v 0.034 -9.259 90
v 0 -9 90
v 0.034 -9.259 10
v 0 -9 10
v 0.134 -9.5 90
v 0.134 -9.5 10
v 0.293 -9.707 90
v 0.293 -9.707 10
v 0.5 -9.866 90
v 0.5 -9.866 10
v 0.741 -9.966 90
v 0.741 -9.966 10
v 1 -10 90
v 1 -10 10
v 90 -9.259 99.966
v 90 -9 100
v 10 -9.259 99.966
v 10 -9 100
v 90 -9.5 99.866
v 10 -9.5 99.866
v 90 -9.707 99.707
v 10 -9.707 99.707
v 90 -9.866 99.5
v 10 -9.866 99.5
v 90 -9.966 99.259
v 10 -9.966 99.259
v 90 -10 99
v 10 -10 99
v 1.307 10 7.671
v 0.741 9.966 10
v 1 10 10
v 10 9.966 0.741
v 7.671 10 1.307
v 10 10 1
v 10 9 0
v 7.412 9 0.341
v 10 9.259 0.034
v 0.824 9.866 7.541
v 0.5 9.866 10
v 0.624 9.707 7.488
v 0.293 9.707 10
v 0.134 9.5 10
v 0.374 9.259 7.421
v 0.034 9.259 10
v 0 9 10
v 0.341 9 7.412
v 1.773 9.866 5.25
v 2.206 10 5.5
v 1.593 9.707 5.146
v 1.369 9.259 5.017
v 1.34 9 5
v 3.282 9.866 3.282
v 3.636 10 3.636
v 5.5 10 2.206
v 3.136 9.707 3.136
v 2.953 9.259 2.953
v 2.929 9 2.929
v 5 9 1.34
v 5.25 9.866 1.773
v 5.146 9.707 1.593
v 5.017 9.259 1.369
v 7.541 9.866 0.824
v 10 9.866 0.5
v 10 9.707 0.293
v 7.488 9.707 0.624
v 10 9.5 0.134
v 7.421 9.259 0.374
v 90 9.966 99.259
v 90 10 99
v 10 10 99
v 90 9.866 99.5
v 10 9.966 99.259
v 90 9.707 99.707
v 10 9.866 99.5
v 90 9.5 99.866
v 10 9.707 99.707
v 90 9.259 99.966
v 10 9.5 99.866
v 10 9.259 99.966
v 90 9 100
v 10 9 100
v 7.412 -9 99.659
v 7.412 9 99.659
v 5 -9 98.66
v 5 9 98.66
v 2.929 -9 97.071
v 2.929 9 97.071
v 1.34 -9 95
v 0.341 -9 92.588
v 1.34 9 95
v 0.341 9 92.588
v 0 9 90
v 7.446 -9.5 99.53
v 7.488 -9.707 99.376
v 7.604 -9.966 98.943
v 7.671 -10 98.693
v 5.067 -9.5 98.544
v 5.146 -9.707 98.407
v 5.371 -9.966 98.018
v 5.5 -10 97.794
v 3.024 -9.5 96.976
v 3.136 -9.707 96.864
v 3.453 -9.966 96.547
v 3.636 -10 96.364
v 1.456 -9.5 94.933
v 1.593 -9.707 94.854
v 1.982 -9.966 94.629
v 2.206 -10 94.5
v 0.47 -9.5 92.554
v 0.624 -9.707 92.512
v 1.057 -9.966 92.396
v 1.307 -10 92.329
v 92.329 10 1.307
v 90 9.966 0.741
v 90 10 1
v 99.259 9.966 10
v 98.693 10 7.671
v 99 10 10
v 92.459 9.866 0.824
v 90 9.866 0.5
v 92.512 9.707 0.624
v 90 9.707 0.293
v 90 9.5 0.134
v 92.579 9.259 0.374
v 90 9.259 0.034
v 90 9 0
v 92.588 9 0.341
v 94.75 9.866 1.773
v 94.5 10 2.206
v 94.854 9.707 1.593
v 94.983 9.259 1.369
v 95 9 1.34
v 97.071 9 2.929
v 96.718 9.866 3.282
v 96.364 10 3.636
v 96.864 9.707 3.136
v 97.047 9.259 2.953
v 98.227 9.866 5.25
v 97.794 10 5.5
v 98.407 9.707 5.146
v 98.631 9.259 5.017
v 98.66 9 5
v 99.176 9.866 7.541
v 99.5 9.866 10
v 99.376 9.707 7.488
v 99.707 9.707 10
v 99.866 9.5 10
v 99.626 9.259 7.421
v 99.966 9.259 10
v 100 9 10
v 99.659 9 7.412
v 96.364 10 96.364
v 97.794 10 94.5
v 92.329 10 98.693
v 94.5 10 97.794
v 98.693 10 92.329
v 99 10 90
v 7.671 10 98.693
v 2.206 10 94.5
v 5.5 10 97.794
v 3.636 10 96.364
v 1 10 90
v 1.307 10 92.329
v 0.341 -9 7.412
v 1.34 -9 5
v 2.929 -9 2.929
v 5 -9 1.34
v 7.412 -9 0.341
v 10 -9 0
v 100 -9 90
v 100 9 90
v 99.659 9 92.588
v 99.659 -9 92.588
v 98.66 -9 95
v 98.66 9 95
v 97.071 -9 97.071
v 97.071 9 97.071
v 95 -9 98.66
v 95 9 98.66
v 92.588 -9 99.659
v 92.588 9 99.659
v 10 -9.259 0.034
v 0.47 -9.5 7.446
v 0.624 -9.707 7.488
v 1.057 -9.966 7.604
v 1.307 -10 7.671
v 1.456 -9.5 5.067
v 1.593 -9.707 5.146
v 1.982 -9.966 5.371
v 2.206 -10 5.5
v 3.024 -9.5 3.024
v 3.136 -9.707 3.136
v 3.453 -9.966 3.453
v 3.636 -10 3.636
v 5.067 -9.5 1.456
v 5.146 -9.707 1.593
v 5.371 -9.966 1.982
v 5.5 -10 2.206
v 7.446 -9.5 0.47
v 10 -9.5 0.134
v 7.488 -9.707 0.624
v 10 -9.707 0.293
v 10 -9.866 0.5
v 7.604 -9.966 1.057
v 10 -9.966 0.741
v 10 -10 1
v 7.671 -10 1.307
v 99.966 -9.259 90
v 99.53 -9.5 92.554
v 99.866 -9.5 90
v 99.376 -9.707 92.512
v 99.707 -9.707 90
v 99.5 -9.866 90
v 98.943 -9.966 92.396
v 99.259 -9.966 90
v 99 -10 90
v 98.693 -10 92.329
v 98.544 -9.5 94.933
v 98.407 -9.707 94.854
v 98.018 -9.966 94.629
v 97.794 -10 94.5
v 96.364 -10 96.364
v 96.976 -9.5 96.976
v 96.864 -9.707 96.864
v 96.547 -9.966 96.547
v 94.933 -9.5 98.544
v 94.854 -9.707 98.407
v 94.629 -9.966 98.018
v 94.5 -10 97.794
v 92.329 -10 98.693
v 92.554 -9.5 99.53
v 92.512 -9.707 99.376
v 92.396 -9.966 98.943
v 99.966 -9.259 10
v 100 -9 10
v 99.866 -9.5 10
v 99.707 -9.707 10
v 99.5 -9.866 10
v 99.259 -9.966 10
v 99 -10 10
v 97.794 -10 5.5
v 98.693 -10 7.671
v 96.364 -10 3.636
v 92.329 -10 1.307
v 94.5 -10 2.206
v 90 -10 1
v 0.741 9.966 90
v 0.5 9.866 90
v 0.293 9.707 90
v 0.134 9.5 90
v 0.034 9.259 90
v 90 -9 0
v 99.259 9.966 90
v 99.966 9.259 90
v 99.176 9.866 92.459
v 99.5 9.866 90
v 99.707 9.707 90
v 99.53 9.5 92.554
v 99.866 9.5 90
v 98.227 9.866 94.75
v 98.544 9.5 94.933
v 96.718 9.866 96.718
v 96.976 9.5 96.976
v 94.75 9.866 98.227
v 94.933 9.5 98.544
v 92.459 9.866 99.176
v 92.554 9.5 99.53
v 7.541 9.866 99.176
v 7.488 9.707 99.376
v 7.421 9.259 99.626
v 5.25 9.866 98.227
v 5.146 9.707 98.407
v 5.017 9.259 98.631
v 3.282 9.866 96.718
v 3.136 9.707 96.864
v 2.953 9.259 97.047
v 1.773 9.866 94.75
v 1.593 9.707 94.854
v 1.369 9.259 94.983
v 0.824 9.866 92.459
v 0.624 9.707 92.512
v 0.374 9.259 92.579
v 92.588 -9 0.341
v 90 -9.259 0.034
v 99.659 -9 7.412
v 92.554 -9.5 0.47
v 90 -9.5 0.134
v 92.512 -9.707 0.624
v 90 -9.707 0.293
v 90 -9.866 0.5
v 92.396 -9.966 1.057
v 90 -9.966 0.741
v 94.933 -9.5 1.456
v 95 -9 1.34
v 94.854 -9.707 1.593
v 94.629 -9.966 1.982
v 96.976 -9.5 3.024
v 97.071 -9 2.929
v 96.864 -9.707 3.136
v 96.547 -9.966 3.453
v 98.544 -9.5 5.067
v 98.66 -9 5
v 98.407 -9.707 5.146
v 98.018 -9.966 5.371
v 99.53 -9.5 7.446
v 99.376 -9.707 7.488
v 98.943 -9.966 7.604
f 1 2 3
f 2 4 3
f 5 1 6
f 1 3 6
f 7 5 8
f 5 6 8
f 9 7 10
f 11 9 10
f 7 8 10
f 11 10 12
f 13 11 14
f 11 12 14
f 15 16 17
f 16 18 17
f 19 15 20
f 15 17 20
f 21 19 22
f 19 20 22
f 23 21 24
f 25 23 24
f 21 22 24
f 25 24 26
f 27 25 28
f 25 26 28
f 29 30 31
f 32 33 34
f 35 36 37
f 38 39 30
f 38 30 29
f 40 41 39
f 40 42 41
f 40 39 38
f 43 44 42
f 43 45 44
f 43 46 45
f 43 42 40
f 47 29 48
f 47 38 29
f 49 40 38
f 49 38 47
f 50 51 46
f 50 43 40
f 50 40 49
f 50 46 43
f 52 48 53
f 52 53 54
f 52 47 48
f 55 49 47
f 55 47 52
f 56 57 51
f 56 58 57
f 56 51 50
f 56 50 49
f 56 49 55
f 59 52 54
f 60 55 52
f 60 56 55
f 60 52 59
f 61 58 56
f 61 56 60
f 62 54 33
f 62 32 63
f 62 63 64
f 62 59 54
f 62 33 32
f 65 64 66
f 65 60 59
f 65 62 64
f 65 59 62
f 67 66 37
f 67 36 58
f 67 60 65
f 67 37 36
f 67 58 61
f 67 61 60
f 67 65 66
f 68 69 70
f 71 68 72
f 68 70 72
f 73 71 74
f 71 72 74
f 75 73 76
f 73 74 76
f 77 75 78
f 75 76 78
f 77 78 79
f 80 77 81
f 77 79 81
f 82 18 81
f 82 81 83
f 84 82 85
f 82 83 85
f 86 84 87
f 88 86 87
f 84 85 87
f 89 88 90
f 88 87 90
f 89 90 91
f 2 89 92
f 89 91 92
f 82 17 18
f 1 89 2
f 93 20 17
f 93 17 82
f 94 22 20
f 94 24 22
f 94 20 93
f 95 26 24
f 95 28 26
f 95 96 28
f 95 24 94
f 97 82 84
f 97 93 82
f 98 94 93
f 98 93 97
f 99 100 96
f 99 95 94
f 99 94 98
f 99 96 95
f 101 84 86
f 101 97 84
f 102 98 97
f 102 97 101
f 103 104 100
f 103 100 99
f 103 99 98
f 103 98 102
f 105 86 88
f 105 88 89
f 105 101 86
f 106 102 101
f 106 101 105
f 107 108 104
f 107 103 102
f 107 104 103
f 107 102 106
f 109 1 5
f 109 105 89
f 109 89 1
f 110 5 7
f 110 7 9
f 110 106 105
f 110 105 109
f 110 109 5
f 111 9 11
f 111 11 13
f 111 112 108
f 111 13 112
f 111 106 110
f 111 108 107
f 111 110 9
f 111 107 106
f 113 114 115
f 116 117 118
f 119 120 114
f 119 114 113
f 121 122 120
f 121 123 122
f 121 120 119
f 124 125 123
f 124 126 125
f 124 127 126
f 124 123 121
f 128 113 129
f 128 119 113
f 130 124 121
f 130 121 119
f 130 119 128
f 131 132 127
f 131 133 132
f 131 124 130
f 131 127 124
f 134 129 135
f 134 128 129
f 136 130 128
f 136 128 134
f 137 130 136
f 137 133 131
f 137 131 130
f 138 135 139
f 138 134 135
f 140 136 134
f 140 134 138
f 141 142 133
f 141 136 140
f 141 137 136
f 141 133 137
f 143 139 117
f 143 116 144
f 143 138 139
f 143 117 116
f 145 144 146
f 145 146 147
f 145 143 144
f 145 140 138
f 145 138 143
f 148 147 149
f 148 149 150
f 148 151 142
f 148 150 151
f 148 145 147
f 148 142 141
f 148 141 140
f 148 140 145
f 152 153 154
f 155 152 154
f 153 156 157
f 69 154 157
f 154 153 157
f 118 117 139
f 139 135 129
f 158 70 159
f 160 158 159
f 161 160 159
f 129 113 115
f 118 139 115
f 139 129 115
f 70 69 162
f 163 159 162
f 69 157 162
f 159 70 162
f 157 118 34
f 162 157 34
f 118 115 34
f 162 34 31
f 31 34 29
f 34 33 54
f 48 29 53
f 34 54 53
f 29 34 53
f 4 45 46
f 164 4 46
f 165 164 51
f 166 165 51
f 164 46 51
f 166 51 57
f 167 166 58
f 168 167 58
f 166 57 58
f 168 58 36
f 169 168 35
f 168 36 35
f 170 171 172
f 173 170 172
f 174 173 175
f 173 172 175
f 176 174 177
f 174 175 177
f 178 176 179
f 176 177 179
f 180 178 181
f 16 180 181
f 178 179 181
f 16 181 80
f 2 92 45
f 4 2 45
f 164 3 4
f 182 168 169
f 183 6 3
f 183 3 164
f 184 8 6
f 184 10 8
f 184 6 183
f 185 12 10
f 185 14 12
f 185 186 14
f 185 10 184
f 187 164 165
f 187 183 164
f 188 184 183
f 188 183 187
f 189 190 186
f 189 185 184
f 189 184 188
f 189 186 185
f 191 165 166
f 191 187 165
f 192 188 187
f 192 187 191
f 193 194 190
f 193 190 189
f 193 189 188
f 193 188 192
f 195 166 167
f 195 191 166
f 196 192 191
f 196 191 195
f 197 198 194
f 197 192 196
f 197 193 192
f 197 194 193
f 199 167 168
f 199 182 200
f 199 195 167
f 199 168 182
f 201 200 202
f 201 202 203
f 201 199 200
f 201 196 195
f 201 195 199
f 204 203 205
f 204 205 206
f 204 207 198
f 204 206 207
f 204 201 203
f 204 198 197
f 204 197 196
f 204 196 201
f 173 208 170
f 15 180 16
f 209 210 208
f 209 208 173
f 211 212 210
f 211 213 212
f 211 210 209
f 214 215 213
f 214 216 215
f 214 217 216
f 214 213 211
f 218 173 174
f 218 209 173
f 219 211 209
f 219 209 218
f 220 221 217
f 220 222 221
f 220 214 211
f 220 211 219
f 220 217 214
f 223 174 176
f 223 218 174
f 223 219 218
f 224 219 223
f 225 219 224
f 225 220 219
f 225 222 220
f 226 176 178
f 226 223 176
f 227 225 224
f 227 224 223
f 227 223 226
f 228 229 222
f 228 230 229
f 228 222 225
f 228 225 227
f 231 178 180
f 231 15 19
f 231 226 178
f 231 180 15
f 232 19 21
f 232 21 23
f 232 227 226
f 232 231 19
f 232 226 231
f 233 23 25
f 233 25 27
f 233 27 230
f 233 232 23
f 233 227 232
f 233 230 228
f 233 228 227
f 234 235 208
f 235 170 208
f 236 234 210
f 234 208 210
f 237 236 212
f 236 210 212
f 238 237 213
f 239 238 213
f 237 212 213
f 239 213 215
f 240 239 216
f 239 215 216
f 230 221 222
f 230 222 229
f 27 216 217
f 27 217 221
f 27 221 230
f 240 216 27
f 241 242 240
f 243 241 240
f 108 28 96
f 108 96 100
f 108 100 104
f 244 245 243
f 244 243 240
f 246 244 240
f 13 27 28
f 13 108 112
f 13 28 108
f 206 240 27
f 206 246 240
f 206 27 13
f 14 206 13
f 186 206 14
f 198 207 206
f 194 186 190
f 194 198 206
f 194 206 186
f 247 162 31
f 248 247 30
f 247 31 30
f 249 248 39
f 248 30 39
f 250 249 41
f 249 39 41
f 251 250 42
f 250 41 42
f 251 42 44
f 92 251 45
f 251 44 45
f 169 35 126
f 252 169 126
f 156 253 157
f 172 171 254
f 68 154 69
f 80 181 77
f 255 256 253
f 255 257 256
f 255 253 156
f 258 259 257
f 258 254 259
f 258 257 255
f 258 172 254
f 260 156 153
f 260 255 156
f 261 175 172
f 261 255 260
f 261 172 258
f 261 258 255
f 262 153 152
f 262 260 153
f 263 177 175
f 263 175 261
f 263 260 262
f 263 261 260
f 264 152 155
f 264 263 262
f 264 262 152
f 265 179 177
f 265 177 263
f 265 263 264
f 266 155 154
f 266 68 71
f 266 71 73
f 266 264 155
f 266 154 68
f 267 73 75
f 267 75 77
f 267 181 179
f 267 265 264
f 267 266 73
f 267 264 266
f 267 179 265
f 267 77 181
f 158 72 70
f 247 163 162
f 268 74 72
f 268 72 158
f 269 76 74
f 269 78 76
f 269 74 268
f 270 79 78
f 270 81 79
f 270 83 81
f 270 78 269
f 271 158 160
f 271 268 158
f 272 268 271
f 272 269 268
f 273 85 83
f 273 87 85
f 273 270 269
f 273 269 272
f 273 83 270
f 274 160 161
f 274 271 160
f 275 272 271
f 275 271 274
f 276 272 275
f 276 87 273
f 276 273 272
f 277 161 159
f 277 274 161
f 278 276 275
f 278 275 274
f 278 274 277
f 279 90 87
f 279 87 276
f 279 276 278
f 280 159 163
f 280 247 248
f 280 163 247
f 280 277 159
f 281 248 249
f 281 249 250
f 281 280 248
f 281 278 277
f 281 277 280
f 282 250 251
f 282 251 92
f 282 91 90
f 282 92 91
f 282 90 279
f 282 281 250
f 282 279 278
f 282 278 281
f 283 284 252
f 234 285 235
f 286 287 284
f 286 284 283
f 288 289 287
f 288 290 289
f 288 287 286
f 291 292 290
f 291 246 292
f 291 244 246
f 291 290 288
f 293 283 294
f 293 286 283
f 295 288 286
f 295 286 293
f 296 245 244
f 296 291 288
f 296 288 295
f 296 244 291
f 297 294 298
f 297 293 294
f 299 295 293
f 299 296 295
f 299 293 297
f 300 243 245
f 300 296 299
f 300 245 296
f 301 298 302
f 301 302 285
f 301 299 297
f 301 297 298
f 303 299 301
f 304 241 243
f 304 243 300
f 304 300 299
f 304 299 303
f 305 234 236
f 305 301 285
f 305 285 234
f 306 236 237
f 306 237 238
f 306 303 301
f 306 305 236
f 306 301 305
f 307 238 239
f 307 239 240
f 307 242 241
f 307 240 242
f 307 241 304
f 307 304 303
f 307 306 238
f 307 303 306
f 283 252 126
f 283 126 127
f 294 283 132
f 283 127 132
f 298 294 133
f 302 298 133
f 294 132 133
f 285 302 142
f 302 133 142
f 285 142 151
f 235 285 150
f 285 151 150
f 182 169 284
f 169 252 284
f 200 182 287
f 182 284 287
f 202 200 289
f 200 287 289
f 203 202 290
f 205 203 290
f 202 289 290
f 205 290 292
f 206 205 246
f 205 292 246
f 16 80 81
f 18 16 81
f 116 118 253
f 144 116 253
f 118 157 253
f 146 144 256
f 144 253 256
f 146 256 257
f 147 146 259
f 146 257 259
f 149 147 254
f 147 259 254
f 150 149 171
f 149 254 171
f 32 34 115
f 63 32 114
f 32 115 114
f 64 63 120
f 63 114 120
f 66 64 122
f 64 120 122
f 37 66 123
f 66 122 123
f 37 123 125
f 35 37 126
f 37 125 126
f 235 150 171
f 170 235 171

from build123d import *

# Parameters (mm, degrees)
BOSS_EXTRUDE1_DEPTH = 10
FILLET1_R           = 1
FILLET2_R           = 1


with BuildPart() as part:
    # Sketch1 → Boss-Extrude1 (new, symmetric)
    with BuildSketch(Plane(origin=(0, 0, 0), x_dir=(1, 0, 0), z_dir=(0, 1, 0))):
        with BuildLine():
            Line((10, 0), (90, 0))
            ThreePointArc((90, 0), (97.071067812, -2.928932188), (100, -10))
            Line((100, -10), (100, -90))
            ThreePointArc((100, -90), (97.071067812, -97.071067812), (90, -100))
            Line((90, -100), (10, -100))
            ThreePointArc((10, -100), (2.928932188, -97.071067812), (0, -90))
            Line((0, -90), (0, -10))
            ThreePointArc((0, -10), (2.928932188, -2.928932188), (10, 0))
        make_face()
    extrude(amount=BOSS_EXTRUDE1_DEPTH, both=True)

    # Fillet1
    fillet1_edges = [part.edges().sort_by_distance(p)[0] for p in [
        (100, -10, 50),
        (97.071067812, -10, 97.071067812),
        (50, -10, 100),
        (2.928932188, -10, 97.071067812),
        (0, -10, 50),
        (2.928932188, -10, 2.928932188),
        (50, -10, 0),
        (97.071067812, -10, 2.928932188),
    ]]
    fillet(fillet1_edges, radius=FILLET1_R)

    # Fillet2
    fillet2_edges = [part.edges().sort_by_distance(p)[0] for p in [
        (97.071067812, 10, 97.071067812),
        (100, 10, 50),
        (97.071067812, 10, 2.928932188),
        (50, 10, 0),
        (2.928932188, 10, 2.928932188),
        (0, 10, 50),
        (2.928932188, 10, 97.071067812),
        (50, 10, 100),
    ]]
    fillet(fillet2_edges, radius=FILLET2_R)


solid = part.part
